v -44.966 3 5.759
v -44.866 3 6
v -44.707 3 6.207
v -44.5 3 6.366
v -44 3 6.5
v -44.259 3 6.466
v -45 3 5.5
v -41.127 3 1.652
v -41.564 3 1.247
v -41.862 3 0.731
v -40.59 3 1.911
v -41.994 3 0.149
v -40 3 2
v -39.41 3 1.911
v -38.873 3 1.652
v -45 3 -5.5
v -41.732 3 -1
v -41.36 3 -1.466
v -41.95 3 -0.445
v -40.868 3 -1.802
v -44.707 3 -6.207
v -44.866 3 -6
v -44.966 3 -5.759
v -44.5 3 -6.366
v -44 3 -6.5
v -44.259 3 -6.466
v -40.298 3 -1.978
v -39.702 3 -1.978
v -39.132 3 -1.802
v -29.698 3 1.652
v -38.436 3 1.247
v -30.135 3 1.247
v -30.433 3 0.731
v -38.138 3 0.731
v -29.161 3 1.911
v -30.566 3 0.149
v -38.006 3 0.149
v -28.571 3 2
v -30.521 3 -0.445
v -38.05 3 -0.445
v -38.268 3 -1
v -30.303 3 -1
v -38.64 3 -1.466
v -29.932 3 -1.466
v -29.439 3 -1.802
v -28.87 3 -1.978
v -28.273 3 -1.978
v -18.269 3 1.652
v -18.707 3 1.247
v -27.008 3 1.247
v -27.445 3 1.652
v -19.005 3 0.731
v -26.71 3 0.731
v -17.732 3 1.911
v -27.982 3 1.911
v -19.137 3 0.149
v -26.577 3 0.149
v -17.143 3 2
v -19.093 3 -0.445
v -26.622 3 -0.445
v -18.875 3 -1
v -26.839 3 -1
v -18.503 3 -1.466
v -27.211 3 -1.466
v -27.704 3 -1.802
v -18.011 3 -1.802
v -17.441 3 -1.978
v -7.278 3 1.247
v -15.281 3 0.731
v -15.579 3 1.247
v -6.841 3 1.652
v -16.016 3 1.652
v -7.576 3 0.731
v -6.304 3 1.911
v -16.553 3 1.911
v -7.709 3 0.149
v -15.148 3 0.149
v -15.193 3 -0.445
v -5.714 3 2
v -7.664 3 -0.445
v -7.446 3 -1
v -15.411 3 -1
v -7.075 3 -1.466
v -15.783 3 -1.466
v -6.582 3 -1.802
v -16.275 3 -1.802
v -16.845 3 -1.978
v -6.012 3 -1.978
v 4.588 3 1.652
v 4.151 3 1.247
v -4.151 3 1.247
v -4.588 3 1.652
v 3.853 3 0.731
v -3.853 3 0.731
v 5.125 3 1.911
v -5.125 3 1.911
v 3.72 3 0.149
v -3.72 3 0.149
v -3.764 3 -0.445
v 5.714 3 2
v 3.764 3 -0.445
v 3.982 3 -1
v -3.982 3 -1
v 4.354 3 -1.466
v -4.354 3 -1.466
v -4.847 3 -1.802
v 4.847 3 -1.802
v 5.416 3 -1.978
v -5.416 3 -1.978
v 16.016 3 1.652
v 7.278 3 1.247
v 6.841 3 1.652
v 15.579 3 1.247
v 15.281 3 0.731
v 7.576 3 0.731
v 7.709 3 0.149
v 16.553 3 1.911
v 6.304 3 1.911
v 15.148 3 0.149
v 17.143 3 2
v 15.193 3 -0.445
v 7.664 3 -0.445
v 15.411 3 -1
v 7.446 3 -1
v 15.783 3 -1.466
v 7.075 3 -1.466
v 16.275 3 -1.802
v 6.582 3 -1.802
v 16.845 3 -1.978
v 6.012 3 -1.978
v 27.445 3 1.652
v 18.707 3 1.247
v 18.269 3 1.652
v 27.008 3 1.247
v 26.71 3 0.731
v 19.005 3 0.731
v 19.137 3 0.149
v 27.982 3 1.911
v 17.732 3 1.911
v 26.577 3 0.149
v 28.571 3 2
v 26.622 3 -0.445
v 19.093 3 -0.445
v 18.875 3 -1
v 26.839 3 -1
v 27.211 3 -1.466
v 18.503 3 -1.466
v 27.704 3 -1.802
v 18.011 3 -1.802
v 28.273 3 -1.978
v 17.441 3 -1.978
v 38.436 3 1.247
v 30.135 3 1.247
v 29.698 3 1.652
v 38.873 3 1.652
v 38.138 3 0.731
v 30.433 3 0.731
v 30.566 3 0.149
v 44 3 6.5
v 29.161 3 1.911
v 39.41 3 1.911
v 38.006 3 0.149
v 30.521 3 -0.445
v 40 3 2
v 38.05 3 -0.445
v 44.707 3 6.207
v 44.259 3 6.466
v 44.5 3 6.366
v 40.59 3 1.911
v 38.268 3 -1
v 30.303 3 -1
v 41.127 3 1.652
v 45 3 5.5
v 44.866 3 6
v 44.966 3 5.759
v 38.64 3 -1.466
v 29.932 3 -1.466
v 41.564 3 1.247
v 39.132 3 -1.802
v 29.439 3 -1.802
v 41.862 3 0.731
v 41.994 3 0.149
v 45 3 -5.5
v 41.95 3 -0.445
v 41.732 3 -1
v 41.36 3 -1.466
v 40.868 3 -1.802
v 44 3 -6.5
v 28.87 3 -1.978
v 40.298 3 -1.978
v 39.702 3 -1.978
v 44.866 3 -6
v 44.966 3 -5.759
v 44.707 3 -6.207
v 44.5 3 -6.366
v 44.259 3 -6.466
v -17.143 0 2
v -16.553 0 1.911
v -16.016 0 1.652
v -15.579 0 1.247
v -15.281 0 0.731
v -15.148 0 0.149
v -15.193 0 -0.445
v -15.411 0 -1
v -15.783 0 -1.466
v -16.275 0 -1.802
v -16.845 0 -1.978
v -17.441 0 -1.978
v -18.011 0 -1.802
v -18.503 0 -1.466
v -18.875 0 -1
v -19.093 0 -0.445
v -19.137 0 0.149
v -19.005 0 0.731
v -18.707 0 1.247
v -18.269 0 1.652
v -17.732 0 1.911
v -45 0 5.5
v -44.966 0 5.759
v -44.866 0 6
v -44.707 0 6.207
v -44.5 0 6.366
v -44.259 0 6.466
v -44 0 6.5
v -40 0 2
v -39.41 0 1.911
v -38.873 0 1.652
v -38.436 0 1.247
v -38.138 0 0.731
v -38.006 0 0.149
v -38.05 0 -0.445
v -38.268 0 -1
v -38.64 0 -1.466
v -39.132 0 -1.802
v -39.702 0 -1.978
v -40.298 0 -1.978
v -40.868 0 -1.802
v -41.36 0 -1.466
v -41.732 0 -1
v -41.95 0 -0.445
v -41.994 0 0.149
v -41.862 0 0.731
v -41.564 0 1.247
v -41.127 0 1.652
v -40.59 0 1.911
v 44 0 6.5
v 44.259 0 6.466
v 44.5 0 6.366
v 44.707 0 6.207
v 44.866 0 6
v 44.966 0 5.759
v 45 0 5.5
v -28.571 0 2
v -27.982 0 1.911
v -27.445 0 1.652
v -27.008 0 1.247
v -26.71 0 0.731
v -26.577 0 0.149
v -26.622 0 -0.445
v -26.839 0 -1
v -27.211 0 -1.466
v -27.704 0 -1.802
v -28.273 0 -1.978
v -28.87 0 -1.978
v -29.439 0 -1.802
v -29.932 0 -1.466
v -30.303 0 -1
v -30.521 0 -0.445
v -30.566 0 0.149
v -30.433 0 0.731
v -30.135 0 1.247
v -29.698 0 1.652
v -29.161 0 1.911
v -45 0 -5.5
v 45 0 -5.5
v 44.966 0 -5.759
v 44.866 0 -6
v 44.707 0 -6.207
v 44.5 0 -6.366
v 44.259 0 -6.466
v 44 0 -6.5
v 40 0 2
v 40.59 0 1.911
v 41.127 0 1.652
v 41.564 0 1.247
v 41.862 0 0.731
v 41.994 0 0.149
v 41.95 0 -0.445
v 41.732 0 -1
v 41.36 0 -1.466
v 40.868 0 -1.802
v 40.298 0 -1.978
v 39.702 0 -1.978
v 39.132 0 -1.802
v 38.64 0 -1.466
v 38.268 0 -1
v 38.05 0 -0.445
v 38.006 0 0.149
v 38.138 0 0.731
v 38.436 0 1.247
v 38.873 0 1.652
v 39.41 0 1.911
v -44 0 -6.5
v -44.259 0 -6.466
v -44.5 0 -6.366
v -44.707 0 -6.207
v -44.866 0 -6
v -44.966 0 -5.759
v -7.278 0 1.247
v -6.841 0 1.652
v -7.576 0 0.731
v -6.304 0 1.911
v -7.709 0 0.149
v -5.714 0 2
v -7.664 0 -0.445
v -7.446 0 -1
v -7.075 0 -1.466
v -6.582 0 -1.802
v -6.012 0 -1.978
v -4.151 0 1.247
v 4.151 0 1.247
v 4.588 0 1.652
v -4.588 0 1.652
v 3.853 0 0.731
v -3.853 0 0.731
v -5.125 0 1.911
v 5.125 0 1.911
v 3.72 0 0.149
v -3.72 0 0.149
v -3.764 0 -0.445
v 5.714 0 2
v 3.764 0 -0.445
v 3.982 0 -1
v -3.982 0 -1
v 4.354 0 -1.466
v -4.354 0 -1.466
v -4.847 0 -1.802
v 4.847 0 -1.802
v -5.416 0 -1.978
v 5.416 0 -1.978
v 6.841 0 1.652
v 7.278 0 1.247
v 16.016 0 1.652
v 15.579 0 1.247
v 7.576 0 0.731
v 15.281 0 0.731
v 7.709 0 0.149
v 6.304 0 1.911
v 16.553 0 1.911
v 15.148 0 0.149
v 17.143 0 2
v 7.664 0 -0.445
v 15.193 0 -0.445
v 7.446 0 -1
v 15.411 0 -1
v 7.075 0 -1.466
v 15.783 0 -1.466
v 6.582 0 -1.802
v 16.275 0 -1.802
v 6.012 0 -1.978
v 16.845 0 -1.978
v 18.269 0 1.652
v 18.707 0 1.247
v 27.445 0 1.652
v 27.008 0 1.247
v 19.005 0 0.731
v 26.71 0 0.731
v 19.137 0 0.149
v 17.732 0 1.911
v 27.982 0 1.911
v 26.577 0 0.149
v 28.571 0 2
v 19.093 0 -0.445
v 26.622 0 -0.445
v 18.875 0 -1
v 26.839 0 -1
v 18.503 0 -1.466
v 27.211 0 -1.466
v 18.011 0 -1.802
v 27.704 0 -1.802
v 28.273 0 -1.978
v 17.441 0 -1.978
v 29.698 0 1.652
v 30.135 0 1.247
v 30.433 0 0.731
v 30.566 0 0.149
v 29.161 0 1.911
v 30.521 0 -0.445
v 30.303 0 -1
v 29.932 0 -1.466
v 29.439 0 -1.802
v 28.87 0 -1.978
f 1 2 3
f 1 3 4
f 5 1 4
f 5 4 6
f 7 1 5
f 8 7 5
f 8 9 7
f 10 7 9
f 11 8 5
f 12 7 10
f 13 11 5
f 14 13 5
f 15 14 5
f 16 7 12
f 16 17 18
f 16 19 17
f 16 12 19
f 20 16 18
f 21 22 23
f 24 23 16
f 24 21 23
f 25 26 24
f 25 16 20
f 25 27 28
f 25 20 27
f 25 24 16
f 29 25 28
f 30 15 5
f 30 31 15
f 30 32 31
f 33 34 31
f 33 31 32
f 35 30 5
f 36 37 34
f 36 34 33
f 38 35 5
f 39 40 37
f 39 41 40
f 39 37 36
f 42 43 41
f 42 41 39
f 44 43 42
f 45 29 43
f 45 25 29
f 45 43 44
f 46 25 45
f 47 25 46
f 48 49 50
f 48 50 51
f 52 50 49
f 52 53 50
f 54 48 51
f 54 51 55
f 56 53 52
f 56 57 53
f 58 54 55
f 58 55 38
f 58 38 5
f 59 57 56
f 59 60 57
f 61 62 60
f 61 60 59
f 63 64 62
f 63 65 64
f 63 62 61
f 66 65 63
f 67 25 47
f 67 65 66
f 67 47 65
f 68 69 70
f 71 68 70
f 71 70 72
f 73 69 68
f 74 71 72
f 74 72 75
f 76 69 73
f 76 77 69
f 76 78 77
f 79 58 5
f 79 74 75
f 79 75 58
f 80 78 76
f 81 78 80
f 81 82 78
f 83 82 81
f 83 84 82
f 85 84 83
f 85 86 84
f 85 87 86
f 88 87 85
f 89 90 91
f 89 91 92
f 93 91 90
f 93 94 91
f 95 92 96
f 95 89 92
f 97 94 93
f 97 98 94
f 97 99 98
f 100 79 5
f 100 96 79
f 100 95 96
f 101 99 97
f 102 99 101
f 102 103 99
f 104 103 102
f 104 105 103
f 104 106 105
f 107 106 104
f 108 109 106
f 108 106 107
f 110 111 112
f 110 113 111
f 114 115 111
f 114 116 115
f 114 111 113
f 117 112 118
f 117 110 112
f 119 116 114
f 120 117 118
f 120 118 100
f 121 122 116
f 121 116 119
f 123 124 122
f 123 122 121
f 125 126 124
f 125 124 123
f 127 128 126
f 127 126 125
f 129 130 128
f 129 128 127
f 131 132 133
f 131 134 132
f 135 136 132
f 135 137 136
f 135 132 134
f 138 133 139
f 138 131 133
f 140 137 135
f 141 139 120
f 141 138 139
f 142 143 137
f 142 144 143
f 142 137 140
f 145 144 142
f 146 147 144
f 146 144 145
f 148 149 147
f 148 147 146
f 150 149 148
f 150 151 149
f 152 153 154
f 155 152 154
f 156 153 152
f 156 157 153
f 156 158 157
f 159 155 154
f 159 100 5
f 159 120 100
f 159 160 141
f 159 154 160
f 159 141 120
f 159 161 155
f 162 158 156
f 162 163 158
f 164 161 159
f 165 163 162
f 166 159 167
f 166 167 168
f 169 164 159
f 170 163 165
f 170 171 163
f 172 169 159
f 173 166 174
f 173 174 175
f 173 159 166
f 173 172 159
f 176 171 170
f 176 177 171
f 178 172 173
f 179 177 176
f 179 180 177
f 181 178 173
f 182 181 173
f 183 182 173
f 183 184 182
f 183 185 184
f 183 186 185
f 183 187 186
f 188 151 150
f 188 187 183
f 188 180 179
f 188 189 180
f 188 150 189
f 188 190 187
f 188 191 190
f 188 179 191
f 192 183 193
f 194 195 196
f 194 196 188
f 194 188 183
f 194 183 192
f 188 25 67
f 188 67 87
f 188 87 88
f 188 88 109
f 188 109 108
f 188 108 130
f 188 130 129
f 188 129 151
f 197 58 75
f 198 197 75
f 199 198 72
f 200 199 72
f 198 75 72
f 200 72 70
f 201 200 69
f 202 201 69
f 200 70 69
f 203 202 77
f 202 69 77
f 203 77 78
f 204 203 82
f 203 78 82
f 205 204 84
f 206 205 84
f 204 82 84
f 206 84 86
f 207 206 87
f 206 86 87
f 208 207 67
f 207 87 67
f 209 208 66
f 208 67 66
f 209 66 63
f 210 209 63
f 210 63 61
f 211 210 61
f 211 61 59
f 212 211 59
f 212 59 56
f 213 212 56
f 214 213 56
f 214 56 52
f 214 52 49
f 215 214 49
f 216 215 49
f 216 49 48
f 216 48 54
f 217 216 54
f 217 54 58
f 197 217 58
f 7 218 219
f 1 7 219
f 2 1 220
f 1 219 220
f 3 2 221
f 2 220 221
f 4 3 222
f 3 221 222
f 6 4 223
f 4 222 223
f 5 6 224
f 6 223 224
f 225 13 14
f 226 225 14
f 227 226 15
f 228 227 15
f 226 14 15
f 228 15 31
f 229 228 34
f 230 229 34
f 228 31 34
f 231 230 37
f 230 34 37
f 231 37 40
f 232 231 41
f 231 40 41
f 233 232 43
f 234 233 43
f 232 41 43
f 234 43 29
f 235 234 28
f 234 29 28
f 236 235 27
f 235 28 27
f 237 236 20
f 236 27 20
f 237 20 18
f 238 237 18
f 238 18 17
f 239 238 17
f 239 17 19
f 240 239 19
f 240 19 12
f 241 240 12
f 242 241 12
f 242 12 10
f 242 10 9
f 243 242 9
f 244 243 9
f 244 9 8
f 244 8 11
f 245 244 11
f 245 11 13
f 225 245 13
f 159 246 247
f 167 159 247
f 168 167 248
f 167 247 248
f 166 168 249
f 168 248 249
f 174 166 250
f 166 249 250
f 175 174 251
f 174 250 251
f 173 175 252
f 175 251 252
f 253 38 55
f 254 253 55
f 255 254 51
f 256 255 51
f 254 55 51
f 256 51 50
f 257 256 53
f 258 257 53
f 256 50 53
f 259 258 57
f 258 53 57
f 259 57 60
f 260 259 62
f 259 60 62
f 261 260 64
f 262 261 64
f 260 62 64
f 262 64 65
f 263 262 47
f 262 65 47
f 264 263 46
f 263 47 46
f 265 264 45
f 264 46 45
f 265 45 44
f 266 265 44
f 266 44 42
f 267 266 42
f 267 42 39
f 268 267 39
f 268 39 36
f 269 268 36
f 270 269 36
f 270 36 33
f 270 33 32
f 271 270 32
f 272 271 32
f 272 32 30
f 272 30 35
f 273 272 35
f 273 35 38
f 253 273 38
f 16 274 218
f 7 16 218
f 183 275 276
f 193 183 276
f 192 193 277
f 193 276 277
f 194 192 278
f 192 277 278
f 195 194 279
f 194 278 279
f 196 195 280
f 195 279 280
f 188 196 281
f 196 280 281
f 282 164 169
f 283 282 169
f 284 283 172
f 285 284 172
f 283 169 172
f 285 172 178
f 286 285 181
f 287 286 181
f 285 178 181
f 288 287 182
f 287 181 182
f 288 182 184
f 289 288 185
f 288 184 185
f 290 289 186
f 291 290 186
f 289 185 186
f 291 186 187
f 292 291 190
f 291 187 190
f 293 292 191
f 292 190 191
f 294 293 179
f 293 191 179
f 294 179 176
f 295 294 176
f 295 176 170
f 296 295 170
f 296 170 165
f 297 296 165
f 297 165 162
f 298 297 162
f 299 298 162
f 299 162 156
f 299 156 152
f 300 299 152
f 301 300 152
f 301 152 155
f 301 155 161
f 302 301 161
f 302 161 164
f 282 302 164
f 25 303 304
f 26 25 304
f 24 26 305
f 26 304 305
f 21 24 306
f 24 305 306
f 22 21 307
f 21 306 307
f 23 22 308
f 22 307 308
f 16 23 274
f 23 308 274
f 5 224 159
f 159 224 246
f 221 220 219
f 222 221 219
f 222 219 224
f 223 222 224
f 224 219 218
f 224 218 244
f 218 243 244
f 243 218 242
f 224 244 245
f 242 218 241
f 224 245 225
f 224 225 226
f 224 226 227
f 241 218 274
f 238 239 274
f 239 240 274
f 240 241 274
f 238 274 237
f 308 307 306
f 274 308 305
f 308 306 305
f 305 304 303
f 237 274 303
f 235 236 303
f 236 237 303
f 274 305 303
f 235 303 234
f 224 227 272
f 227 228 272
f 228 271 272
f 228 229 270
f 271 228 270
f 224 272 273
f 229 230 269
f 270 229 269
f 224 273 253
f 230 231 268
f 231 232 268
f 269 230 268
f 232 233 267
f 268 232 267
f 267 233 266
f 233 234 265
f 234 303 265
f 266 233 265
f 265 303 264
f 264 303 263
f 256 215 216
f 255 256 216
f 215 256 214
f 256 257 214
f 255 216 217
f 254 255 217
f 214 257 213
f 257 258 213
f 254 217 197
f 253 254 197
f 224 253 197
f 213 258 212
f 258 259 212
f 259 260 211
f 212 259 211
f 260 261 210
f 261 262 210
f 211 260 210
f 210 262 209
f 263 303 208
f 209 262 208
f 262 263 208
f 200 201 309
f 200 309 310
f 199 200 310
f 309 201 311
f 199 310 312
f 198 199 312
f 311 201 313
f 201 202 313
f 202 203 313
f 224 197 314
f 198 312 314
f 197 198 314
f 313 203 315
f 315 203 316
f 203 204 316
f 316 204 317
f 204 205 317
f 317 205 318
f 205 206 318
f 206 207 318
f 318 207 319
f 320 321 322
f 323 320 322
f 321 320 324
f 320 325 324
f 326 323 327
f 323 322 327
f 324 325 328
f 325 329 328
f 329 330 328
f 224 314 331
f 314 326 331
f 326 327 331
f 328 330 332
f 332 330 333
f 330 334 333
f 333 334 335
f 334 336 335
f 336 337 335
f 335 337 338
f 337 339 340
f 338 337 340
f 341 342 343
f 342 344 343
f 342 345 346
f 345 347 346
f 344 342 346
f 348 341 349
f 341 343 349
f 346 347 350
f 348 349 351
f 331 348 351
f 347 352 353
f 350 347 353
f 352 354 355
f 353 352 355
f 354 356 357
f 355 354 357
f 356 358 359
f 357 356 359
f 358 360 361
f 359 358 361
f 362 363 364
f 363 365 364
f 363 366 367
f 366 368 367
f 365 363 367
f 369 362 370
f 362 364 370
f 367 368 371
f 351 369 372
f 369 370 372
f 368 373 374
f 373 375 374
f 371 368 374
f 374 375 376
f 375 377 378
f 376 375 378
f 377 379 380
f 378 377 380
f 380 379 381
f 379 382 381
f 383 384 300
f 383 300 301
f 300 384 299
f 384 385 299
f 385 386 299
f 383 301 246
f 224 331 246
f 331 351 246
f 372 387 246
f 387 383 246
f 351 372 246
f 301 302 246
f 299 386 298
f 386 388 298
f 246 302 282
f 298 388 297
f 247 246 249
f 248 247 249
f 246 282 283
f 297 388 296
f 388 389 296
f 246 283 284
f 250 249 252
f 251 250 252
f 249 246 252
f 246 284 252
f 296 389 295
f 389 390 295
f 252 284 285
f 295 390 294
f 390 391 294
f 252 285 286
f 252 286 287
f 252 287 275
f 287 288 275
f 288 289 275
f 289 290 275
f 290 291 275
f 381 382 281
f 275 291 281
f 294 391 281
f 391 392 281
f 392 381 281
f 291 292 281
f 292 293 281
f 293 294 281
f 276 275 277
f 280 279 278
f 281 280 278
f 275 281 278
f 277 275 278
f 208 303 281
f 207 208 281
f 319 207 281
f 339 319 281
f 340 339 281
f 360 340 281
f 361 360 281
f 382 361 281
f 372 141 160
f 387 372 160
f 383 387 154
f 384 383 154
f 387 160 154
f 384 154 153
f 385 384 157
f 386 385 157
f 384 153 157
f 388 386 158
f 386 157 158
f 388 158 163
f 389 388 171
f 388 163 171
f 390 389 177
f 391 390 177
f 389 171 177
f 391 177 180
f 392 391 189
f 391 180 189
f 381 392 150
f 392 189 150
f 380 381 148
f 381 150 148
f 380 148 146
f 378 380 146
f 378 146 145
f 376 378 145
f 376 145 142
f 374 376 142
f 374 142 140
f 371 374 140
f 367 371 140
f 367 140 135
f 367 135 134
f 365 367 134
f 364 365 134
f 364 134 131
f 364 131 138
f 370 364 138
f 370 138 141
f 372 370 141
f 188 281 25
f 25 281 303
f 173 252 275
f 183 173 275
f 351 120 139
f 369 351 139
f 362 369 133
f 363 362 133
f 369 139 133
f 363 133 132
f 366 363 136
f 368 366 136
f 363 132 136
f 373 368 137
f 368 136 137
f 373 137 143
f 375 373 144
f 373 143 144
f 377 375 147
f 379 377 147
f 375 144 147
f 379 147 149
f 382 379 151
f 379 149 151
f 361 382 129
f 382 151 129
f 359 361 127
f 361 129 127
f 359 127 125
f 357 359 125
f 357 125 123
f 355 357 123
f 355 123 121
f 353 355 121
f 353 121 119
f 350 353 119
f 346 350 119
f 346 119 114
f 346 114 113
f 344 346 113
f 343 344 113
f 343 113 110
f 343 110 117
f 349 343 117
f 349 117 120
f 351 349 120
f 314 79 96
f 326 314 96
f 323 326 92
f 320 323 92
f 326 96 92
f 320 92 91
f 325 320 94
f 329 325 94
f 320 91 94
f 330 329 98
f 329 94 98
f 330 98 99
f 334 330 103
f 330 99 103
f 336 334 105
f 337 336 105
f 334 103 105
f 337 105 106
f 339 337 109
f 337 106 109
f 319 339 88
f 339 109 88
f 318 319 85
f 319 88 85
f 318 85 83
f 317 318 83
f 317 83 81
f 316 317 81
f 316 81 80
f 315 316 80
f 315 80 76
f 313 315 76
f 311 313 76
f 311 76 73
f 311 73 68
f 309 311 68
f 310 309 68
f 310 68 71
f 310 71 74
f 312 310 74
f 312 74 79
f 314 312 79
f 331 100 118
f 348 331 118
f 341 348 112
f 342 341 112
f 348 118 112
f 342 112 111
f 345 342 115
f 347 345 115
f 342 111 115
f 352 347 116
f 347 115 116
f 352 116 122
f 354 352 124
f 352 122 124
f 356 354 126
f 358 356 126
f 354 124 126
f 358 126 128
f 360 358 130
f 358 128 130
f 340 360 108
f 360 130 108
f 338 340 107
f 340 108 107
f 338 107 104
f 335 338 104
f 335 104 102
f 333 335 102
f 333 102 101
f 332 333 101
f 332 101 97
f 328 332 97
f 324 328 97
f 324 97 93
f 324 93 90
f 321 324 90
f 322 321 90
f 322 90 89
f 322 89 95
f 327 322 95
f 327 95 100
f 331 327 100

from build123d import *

# Parameters (mm, degrees)
BOSS_EXTRUDE1_DEPTH = 3
SKETCH3_R           = 2
CUT_EXTRUDE1_DEPTH  = 46.565886362


with BuildPart() as part:
    # Sketch1 → Boss-Extrude1 (new body)
    with BuildSketch(Plane(origin=(0, 0, 0), x_dir=(1, 0, 0), z_dir=(0, 1, 0))):
        with BuildLine():
            Line((-44, -6.5), (44, -6.5))
            ThreePointArc((44, -6.5), (44.707106781, -6.207106781), (45, -5.5))
            Line((45, -5.5), (45, 5.5))
            ThreePointArc((45, 5.5), (44.707106781, 6.207106781), (44, 6.5))
            Line((44, 6.5), (-44, 6.5))
            ThreePointArc((-44, 6.5), (-44.707106781, 6.207106781), (-45, 5.5))
            Line((-45, 5.5), (-45, -5.5))
            ThreePointArc((-45, -5.5), (-44.707106781, -6.207106781), (-44, -6.5))
        make_face()
    extrude(amount=BOSS_EXTRUDE1_DEPTH)

    # Sketch3 → Cut-Extrude1 (cut, through all)
    with BuildSketch(Plane(origin=(0, 3, 0), x_dir=(1, 0, 0), z_dir=(0, 1, 0))):
        with Locations(Location((-40, 0, 0), (0, 0, 270))):
            Circle(SKETCH3_R)
        with Locations(Location((-28.571428571, 0, 0), (0, 0, 270))):
            Circle(SKETCH3_R)
        with Locations(Location((-17.142857143, 0, 0), (0, 0, 270))):
            Circle(SKETCH3_R)
        with Locations(Location((-5.714285714, 0, 0), (0, 0, 270))):
            Circle(SKETCH3_R)
        with Locations(Location((5.714285714, 0, 0), (0, 0, 270))):
            Circle(SKETCH3_R)
        with Locations(Location((17.142857143, 0, 0), (0, 0, 270))):
            Circle(SKETCH3_R)
        with Locations(Location((28.571428571, 0, 0), (0, 0, 270))):
            Circle(SKETCH3_R)
        with Locations(Location((40, 0, 0), (0, 0, 270))):
            Circle(SKETCH3_R)
    extrude(amount=-CUT_EXTRUDE1_DEPTH, mode=Mode.SUBTRACT)


solid = part.part
